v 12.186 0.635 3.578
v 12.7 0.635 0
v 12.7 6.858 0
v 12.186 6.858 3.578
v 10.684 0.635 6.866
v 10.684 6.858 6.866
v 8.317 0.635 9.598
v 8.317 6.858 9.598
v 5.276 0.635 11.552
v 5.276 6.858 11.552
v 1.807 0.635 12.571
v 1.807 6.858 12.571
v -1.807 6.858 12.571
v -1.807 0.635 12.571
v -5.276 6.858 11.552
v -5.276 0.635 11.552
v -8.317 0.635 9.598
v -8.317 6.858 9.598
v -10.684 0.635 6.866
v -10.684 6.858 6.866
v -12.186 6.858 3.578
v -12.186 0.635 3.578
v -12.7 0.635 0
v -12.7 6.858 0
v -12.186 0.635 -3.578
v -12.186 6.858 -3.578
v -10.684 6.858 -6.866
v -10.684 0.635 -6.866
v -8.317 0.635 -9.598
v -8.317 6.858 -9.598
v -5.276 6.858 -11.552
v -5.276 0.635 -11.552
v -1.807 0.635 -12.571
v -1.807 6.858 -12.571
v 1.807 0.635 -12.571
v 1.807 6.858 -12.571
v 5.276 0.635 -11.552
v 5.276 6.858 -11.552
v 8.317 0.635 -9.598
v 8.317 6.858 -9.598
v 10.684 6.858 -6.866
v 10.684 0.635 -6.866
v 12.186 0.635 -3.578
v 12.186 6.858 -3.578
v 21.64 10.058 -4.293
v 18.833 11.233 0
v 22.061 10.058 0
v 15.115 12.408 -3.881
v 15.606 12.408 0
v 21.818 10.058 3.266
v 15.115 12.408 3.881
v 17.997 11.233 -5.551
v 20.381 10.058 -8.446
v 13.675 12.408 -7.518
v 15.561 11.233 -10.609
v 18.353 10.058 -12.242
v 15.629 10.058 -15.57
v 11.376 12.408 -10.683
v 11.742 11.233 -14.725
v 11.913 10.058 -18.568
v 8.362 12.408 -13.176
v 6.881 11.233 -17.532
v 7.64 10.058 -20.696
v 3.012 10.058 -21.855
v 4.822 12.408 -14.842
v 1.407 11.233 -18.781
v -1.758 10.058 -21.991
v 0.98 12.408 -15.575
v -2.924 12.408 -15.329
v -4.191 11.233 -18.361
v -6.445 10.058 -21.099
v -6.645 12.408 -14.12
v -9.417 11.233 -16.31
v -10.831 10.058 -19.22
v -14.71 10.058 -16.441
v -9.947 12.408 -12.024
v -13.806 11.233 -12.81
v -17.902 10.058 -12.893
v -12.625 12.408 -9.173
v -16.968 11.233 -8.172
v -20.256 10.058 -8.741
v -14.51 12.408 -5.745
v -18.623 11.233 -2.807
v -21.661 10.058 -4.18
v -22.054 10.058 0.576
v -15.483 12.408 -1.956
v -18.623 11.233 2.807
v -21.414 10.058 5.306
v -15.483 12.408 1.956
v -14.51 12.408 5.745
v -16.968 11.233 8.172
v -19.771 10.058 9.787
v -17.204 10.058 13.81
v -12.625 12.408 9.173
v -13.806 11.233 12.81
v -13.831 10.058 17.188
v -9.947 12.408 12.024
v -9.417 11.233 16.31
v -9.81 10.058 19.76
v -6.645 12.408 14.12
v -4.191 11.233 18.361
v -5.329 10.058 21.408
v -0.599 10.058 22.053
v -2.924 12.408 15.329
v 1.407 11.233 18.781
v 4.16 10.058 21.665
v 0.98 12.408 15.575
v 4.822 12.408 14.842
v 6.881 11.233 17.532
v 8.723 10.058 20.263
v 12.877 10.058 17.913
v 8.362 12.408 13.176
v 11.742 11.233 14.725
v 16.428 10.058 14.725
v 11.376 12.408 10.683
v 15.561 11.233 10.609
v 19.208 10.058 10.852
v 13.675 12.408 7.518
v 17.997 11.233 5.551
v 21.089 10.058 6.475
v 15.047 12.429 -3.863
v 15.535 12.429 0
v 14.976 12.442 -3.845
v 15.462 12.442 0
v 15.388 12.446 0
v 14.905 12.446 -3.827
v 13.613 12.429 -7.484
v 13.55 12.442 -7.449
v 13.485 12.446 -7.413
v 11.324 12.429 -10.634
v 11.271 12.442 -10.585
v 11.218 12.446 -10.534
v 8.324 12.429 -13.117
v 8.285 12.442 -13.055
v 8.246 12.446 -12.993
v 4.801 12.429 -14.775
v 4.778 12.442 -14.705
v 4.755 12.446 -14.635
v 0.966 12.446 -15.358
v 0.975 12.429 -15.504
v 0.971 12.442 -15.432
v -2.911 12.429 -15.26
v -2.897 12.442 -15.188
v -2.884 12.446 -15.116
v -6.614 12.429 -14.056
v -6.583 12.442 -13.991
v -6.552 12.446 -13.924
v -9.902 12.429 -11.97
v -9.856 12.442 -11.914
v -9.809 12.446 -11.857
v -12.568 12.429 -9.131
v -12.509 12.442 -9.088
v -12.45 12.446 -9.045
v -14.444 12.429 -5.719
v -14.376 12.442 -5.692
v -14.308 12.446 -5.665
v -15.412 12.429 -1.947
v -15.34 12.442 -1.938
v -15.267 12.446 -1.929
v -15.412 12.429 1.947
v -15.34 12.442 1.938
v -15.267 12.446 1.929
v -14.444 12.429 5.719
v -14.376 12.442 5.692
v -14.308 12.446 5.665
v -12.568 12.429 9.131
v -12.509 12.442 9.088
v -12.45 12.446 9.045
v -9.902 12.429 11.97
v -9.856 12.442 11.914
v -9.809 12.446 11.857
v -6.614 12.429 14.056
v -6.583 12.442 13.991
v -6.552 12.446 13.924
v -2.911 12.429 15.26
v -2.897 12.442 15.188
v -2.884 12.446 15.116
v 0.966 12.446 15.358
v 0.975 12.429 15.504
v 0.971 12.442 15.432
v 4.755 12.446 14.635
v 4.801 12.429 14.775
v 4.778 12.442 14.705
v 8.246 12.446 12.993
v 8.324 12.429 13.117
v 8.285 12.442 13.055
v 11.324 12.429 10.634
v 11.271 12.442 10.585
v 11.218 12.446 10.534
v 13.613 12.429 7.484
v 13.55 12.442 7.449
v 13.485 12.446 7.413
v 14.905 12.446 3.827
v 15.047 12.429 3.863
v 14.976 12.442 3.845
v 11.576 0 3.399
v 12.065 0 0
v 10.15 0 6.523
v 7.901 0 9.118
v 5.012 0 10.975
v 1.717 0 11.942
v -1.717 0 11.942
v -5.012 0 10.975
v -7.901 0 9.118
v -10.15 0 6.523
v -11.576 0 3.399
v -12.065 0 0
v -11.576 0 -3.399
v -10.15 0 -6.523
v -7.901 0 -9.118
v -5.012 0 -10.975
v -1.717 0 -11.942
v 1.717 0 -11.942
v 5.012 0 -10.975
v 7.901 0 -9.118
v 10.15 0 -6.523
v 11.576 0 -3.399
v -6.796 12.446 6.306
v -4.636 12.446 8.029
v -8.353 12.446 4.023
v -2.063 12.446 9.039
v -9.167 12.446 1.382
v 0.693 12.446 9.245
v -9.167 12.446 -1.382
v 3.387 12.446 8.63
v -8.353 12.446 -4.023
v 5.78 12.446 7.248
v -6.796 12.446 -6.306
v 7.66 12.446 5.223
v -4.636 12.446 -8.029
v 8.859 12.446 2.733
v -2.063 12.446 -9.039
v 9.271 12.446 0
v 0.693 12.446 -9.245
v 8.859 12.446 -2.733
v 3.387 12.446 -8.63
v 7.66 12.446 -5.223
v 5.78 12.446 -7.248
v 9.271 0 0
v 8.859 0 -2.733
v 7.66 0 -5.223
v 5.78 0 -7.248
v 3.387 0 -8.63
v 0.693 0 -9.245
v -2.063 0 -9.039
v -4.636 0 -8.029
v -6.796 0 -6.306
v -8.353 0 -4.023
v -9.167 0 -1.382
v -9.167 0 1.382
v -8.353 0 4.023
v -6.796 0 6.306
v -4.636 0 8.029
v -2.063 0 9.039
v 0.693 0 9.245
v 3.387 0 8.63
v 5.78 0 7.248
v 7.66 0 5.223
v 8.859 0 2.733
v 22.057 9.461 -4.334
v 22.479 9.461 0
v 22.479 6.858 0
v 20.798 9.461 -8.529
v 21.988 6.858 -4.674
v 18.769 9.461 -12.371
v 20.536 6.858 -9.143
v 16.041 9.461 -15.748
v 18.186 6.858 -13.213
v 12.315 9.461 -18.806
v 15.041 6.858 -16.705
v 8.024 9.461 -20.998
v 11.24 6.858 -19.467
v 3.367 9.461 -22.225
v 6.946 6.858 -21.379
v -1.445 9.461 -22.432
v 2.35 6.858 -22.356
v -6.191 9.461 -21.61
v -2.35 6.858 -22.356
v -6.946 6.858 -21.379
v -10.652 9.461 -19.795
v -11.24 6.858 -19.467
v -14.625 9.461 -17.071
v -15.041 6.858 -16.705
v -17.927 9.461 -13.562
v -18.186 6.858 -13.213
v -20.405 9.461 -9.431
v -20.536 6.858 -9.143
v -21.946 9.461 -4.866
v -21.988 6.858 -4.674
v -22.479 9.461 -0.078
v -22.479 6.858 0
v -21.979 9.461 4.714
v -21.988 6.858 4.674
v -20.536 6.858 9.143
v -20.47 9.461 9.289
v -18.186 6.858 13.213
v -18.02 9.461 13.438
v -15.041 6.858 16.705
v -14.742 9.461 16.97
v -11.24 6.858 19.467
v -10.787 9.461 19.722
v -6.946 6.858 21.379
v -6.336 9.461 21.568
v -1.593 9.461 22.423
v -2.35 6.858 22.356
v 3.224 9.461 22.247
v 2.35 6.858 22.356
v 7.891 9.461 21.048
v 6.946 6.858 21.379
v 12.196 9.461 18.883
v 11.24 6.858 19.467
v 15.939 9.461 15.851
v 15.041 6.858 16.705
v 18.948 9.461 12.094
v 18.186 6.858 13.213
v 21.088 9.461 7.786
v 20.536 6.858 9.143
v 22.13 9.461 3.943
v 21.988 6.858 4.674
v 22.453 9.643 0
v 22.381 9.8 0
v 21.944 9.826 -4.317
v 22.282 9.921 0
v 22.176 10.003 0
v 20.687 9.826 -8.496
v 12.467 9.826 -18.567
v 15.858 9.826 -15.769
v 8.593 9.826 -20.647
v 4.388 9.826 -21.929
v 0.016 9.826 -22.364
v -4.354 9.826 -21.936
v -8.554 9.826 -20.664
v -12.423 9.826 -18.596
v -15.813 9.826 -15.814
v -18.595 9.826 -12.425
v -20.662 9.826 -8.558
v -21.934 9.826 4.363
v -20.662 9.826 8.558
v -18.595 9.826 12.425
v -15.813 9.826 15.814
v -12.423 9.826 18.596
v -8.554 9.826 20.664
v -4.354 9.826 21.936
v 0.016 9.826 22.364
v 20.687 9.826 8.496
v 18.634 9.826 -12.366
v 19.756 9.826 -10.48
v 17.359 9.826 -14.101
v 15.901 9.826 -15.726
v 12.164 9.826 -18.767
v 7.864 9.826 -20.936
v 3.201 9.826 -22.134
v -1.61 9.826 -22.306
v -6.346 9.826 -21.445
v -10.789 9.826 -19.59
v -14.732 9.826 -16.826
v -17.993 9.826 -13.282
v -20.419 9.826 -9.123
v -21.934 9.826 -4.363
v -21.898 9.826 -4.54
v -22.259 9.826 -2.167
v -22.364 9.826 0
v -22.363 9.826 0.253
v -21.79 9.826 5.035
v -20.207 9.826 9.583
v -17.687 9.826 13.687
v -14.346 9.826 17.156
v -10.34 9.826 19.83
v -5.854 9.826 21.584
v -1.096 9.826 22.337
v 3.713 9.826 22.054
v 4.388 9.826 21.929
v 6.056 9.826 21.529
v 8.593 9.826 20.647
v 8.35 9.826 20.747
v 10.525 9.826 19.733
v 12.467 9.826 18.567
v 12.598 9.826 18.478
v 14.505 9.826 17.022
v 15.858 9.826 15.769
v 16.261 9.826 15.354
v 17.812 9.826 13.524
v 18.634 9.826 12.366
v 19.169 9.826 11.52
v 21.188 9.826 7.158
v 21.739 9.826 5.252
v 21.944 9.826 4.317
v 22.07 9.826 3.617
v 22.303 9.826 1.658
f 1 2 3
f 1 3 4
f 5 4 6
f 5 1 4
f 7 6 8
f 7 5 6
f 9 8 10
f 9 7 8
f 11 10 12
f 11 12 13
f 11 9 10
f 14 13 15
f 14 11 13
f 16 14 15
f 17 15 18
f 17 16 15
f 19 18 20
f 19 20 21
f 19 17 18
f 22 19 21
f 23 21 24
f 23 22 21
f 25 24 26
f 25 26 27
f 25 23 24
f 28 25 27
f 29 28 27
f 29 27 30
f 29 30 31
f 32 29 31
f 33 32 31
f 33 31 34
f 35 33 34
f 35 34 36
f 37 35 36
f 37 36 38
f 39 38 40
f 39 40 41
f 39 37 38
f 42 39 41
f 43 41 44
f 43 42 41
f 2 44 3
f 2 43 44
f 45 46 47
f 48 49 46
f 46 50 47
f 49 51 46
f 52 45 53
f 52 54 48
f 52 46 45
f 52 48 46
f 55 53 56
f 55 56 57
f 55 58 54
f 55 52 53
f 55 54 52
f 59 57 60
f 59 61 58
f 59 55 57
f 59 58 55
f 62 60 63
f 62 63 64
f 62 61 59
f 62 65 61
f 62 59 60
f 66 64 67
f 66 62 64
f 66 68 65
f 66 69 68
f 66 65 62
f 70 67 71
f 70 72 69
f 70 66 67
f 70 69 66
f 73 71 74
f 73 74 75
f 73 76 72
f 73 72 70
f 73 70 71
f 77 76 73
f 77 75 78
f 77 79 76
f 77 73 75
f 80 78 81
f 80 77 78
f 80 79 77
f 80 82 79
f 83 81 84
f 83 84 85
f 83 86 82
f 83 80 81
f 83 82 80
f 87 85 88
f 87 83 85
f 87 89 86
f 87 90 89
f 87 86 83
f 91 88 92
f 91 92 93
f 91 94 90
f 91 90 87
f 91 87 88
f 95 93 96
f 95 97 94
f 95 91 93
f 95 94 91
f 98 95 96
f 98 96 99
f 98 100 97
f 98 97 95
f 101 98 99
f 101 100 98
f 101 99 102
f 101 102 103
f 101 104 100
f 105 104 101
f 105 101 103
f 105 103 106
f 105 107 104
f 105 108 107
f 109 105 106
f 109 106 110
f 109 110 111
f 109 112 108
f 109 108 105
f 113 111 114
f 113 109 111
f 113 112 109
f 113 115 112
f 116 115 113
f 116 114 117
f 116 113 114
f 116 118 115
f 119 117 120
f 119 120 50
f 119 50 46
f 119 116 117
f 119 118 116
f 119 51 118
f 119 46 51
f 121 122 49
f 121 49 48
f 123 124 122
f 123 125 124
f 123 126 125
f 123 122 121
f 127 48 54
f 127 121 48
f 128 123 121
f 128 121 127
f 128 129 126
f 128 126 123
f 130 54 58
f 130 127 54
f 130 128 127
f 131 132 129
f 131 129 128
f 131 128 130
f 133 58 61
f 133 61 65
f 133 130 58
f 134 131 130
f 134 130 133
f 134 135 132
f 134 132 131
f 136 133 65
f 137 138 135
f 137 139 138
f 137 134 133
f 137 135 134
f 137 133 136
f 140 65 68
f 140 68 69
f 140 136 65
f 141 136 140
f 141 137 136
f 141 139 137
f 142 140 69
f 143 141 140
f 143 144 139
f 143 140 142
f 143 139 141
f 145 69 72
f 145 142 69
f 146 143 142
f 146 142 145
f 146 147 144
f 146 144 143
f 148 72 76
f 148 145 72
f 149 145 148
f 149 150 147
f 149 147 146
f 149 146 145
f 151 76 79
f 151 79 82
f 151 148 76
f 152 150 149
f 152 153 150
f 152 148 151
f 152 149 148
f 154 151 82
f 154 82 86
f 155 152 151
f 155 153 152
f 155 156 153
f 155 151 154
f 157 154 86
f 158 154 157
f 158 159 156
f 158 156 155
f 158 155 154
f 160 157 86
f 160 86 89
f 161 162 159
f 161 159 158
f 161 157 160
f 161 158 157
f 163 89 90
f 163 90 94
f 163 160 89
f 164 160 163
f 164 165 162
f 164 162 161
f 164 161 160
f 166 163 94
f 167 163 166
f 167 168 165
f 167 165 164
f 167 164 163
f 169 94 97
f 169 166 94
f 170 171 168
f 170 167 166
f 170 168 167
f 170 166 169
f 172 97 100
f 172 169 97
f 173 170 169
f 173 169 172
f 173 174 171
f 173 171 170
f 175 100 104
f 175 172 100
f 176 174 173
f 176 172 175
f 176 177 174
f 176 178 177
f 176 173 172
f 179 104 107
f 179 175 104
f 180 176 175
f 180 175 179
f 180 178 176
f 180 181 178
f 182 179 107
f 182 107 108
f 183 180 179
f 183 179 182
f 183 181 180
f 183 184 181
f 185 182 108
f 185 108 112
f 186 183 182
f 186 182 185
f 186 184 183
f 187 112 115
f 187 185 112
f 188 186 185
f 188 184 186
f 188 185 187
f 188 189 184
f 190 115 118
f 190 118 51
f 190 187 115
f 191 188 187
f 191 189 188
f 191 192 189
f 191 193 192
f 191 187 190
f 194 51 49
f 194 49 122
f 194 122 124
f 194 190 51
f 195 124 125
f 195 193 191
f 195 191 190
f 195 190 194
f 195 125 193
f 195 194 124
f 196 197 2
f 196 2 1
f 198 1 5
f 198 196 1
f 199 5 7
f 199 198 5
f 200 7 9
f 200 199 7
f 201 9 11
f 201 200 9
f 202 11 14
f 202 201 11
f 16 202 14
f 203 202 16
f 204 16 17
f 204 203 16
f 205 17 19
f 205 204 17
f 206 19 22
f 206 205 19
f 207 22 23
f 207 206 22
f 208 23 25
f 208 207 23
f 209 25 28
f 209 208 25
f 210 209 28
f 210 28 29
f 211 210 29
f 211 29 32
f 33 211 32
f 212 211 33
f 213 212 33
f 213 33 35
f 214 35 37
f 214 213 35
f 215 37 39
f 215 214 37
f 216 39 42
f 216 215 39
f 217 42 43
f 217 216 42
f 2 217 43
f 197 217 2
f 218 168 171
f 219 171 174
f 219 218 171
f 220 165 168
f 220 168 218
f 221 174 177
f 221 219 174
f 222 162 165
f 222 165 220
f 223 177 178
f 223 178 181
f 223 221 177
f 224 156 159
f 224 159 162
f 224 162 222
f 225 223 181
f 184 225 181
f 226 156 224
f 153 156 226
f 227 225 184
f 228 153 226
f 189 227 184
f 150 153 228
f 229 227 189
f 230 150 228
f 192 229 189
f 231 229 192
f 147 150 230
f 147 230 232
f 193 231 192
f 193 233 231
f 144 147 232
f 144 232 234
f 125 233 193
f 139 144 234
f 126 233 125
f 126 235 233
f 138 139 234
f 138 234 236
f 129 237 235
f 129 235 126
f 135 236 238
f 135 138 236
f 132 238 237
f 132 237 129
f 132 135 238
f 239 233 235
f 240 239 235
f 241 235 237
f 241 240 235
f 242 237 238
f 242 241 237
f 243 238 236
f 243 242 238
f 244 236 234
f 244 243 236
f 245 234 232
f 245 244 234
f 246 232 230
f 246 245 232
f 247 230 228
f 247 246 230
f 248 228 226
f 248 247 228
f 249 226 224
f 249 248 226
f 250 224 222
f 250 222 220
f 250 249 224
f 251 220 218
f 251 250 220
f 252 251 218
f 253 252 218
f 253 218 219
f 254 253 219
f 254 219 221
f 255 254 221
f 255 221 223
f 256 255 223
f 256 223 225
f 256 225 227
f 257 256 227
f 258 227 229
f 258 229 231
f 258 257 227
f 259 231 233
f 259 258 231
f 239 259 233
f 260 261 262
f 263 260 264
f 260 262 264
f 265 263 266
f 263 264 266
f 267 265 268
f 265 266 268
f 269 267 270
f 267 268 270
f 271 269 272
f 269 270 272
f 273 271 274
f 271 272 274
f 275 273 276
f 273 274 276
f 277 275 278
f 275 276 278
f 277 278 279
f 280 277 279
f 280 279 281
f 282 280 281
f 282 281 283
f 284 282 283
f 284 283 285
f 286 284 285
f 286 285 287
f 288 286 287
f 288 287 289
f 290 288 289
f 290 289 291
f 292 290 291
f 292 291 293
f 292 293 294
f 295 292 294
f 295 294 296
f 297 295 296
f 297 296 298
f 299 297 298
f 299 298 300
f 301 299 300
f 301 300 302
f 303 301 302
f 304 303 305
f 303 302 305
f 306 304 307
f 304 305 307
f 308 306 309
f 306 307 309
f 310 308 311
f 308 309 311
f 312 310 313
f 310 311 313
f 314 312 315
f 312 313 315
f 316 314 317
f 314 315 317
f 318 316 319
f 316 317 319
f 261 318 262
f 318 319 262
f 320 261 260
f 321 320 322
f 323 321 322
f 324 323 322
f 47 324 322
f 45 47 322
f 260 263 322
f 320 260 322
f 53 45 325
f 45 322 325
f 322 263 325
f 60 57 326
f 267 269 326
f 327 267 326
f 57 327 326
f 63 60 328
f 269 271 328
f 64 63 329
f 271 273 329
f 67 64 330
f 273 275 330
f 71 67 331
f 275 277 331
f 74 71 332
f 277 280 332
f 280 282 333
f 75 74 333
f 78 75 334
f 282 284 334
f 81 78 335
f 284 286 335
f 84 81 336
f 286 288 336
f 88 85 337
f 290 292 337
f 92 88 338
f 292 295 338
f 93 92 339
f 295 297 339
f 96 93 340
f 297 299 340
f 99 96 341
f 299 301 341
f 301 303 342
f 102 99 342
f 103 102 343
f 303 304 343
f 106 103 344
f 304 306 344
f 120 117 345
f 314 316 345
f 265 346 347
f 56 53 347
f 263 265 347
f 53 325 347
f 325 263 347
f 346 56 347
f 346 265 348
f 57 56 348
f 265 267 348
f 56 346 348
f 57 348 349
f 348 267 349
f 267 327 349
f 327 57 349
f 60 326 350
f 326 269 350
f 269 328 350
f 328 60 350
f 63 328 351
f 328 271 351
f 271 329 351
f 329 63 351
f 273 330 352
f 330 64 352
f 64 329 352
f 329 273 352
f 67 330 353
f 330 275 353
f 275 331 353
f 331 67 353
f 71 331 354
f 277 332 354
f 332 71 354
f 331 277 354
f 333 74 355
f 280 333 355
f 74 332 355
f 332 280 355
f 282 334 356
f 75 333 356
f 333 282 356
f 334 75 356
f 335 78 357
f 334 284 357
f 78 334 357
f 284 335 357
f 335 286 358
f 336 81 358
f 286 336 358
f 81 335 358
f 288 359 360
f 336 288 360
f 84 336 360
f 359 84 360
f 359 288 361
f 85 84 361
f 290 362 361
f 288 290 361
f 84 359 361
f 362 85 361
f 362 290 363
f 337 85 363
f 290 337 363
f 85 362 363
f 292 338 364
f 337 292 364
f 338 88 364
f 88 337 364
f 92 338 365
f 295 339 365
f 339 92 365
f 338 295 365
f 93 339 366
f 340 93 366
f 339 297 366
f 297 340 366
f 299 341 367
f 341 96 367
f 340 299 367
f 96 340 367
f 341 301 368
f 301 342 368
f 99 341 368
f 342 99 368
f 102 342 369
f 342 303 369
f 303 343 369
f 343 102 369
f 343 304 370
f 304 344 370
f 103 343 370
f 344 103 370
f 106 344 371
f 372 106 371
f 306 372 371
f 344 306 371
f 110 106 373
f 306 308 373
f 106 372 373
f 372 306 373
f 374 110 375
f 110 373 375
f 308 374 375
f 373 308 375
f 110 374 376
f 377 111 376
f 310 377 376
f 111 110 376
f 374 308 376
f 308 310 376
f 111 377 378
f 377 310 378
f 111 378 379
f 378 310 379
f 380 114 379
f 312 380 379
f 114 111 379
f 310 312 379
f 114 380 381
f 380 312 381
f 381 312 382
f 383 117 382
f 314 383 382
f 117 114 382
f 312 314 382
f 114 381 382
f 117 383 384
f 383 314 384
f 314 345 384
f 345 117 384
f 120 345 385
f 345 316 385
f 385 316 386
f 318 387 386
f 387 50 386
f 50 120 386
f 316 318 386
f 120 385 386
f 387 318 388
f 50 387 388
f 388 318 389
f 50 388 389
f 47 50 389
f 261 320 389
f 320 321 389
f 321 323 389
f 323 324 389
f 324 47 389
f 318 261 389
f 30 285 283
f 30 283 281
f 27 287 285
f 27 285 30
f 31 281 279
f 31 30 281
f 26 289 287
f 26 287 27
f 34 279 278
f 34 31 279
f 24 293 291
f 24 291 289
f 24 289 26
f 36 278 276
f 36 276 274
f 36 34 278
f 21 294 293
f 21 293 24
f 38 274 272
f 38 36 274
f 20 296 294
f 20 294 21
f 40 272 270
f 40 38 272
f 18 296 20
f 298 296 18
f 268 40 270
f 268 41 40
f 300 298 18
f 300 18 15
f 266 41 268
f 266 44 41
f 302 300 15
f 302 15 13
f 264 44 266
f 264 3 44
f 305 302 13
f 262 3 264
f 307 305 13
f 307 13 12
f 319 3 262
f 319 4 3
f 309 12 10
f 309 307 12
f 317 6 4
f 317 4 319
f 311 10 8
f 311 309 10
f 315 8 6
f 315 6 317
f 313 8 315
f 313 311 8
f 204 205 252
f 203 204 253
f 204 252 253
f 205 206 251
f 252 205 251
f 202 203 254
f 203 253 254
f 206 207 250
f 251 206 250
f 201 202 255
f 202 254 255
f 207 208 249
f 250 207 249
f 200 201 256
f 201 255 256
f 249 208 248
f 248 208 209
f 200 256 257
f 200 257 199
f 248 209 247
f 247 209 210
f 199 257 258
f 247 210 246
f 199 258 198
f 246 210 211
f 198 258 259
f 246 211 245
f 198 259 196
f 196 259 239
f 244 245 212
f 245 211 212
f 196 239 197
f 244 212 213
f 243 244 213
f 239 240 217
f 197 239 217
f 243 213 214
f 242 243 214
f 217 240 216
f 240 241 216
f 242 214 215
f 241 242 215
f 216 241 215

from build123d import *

# Parameters (mm, degrees)
SKETCH1_R           = 22.479
SKETCH1_R_2         = 9.271
BOSS_EXTRUDE1_DEPTH = 12.446
SKETCH2_R           = 22.479
SKETCH2_R_2         = 12.7
CUT_EXTRUDE1_DEPTH  = 6.858
CHAMFER1_SIZE       = 2.54
CHAMFER1_SIZE2      = 6.978592645
CHAMFER2_SIZE       = 0.635
FILLET1_R           = 0.635


with BuildPart() as part:
    # Sketch1 → Boss-Extrude1 (new body)
    with BuildSketch(Plane(origin=(0, 0, 0), x_dir=(1, 0, 0), z_dir=(0, 1, 0))):
        Circle(SKETCH1_R)
        Circle(SKETCH1_R_2, mode=Mode.SUBTRACT)
    extrude(amount=BOSS_EXTRUDE1_DEPTH)

    # Sketch2 → Cut-Extrude1 (cut)
    with BuildSketch(Plane.XZ):
        Circle(SKETCH2_R)
        Circle(SKETCH2_R_2, mode=Mode.SUBTRACT)
    extrude(amount=-CUT_EXTRUDE1_DEPTH, mode=Mode.SUBTRACT)

    # Chamfer1
    chamfer1_edges = [part.edges().sort_by_distance(p)[0] for p in [
        (-22.479, 12.446, 0),
    ]]
    chamfer1_side = [part.faces().sort_by_distance(p)[0] for p in [
        (-22.479, 9.652, 0),
    ]]
    chamfer(chamfer1_edges, length=CHAMFER1_SIZE, length2=CHAMFER1_SIZE2, reference=chamfer1_side[0])

    # Chamfer2
    chamfer2_edges = [part.edges().sort_by_distance(p)[0] for p in [
        (-12.7, 0, 0),
    ]]
    chamfer(chamfer2_edges, length=CHAMFER2_SIZE)

    # Fillet1
    fillet1_edges = [part.edges().sort_by_distance(p)[0] for p in [
        (-15.500407355, 12.446, 0),
        (-22.479, 9.906, 0),
    ]]
    fillet(fillet1_edges, radius=FILLET1_R)


solid = part.part
